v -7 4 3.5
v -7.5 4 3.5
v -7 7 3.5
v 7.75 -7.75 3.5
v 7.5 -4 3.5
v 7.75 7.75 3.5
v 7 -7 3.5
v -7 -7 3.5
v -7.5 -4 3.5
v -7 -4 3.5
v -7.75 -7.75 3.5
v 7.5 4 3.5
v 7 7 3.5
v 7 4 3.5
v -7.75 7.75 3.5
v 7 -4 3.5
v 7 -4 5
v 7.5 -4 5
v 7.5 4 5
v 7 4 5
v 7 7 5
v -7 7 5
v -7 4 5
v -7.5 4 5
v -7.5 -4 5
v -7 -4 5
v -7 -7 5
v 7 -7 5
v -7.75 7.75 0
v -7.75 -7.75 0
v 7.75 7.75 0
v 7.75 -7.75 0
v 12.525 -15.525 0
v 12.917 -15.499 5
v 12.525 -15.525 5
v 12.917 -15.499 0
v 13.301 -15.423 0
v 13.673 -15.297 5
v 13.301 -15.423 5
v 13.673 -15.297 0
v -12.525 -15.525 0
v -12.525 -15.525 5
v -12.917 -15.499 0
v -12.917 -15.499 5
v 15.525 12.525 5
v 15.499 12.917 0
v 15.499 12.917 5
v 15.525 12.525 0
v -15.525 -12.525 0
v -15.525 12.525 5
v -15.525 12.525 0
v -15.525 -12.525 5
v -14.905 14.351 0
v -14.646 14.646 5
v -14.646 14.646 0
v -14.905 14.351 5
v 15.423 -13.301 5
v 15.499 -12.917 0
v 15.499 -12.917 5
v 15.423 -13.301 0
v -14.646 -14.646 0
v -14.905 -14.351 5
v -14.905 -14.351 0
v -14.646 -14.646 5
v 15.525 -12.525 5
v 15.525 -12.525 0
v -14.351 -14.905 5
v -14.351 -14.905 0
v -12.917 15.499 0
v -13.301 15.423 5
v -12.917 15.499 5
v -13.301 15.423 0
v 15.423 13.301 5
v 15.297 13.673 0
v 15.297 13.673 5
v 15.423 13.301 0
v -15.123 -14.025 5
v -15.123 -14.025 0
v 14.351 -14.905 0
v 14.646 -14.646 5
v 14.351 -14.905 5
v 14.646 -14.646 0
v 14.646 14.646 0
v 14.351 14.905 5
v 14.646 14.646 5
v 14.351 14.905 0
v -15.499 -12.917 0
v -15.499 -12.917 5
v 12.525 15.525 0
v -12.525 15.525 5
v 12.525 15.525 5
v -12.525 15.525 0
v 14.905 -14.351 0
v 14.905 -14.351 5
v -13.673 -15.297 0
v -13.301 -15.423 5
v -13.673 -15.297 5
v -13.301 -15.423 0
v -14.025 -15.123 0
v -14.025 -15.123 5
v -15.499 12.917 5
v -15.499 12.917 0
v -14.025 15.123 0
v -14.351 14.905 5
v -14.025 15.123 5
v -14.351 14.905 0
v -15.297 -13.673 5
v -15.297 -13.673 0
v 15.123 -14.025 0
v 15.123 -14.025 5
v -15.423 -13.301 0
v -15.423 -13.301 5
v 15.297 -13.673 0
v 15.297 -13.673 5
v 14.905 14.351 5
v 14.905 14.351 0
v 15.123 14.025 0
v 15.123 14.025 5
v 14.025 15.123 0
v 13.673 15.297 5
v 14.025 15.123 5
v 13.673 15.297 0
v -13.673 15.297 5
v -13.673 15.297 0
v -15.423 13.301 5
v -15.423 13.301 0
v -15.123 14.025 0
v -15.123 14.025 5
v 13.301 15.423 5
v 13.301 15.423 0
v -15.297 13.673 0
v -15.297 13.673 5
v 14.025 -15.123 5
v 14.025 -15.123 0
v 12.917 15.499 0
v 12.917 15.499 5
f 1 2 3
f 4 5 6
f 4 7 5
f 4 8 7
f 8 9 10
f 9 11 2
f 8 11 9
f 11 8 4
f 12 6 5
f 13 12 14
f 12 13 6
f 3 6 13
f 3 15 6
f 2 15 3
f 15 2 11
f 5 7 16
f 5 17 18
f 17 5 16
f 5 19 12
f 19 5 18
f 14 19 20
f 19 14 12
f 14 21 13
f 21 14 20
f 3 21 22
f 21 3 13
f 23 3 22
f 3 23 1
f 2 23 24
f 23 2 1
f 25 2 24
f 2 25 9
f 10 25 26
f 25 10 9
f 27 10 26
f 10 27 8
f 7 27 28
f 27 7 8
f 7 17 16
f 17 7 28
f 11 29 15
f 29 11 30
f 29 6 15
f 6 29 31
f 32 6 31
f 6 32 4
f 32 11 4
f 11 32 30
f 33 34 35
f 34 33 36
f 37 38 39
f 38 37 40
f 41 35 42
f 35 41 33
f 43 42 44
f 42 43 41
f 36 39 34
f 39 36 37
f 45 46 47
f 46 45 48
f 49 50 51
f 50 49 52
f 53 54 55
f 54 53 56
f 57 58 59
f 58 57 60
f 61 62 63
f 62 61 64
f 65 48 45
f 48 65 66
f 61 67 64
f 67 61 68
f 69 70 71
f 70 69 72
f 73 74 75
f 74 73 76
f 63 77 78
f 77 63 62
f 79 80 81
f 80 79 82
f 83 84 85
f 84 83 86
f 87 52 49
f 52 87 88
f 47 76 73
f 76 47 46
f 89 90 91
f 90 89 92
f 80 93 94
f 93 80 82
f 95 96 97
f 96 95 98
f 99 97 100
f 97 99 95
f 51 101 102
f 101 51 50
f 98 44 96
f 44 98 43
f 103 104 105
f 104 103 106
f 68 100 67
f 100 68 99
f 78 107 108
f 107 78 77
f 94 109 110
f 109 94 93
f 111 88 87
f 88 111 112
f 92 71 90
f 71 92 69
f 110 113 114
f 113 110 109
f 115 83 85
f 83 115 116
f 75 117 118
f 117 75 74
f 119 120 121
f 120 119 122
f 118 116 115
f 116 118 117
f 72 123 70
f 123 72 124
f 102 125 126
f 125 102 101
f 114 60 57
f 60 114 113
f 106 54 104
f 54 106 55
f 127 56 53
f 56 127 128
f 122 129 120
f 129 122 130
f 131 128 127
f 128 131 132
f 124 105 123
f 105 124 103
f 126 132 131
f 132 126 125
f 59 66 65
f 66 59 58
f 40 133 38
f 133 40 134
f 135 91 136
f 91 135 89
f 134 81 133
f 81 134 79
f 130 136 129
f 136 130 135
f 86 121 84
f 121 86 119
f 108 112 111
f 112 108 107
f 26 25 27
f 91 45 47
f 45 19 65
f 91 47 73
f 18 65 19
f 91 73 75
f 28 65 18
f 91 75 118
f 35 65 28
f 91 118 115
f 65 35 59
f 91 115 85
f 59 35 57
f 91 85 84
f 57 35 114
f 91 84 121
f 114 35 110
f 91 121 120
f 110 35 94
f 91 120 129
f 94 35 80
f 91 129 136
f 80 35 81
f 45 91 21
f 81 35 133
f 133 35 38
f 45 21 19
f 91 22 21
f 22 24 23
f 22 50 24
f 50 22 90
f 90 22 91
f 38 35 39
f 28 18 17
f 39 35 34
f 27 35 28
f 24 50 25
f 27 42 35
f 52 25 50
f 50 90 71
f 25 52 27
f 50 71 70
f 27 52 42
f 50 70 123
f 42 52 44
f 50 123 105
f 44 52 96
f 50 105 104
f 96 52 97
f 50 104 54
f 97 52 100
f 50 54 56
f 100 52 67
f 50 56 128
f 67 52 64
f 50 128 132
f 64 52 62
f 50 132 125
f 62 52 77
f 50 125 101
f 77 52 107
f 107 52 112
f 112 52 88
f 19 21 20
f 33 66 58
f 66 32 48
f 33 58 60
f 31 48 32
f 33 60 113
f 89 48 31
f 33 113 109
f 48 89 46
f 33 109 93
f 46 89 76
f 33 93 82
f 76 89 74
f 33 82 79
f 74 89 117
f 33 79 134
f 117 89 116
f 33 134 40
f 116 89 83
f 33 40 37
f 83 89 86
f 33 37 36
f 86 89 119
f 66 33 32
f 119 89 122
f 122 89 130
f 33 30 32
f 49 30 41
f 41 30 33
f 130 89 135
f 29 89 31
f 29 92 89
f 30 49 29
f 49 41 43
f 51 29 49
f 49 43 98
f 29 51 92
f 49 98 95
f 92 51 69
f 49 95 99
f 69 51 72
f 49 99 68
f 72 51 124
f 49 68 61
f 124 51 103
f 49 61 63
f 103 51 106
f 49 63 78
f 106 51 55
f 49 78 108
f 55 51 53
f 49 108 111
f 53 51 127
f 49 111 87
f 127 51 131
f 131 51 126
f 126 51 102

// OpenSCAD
// file: keyboard_lib.scad
// keyboard_lib.scad
// Reusable MX switch-plate geometry engine — the SHARED pieces only. Anything
// used by just one entry file lives in that file instead (sample.scad,
// preview.scad, assembly.scad). Parameters + geometry here; NO layout data
// (that's keyboard_layout.scad).
//
// For Gateron / Cherry MX-compatible switches (14.0 mm plate cutout, 19.05 mm pitch).
//
// ------------------------------------------------------------------ HOW TO USE
// Don't render this file directly. From an entry file:
//     use     <keyboard_lib.scad>      // just calling plate()/case()
//     include <keyboard_lib.scad>      // also need the parameters in scope
// `use` imports the modules/functions but NOT the parameters below; that's fine
// when you only call plate()/case() (each resolves its own params here). Files
// that define their own geometry (sample/preview/assembly) `include` instead so
// plate_t, U, etc. are visible to them.
//
// The shared part modules take your layout as ARGUMENTS (rather than reading
// globals) so the engine stays reusable across different boards.

$fn = 48;

/* ============================ BOARD / SWITCH ============================ */
board_w  = 16.5;       // KEY FIELD width  in U (extent the keys occupy)
board_h  = 6.75;       // KEY FIELD height in U
pad      = 0.25;       // padding added around the key field, per side, in U
U        = 19.05;      // 1U pitch (MX standard)
cutout   = 14.0;       // switch plate cutout (square), MX standard
plate_t    = 5.0;      // total plate thickness
clip_lip   = 1.5;      // top retention lip: 14 mm cutout only this deep (MX clips)
body_clear = 15.5;     // opening below the lip — switch body/clips clear here
corner_r   = 3;        // plate corner rounding (0 = square corners)

clip_notches = true;   // small side reliefs so switch clips grab the 1.5 mm lip
enc_hole_d   = 7.2;    // rotary encoder (EC11) shaft-bushing clearance hole

/* ---- case (case / assembly parts) ---- */
wall_t   = 3.0;        // outer wall thickness
floor_t  = 2.5;        // case floor thickness
inner_h  = 13.0;       // cavity depth below the plate (switch bodies + wiring)
ledge    = 3.0;        // inward shelf the plate rests on
plate_gap= 0.25;       // clearance around the plate where it drops into the case
usb_w    = 12.0;       // USB opening width  (back edge, +Y / function-row side)
usb_h    = 7.0;        // USB opening height
support_d = 4.0;       // support-post diameter (fits the ~5 mm row-boundary gaps)
seat_depth = 2.0;      // indent in the plate underside each post seats into
seat_d     = 3.0;      // registration peg diameter on top of each post
seat_fit   = 0.30;     // diametral clearance: the plate pocket is seat_d + seat_fit

/* ============================ ACCESSORS ============================ */
// key record: [ x, y, w, stab, "label" ]  (label accessor lives in preview.scad)
function kx(k) = k[0];
function ky(k) = k[1];
function kw(k) = k[2];
function ks(k) = k[3];

// key center in plate mm coords (origin at plate center; y up so row 0 is at top)
function key_cx(k) = (kx(k) + kw(k)/2 - board_w/2) * U;
function key_cy(k) = (board_h/2 - (ky(k) + 0.5)) * U;
// support-post center (given as [x,y] center in U field coords)
function sup_x(s) = (s[0] - board_w/2) * U;
function sup_y(s) = (board_h/2 - s[1]) * U;

// MX stabilizer stem spacing (mm, center-to-center) by width — approximate
function stab_span(w) = w >= 6 ? 100.0 : (w >= 2 ? 23.8 : 0);

/* ============================ GEOMETRY ============================ */
// stabilizer pockets (2D), centered at origin
module stab_2d(w) {
    span = stab_span(w);
    if (span > 0)
        for (sx = [-1, 1])
            translate([sx * span/2, -0.75]) square([7.0, 15.0], center = true);
}

// 3D stepped switch hole for a `plate_t`-thick plate, centered at origin:
//   top `clip_lip` mm  -> 14 mm square (+ clip notches): retains the MX clips
//   remainder (below)  -> `body_clear` opening: switch body + clips clear
//   stabilizer pockets -> full depth
module key_hole_3d(w, stab) {
    // retention lip at the TOP of the plate
    translate([0, 0, plate_t - clip_lip]) linear_extrude(clip_lip + 0.1) {
        square([cutout, cutout], center = true);
        if (clip_notches)
            for (sx = [-1, 1])
                translate([sx * cutout/2, 0]) square([1.0, cutout - 6], center = true);
    }
    // body relief below the lip, open through the bottom
    translate([0, 0, -0.1]) linear_extrude(plate_t - clip_lip + 0.1)
        square([body_clear, body_clear], center = true);
    // stabilizer pockets, full depth
    if (stab)
        translate([0, 0, -0.1]) linear_extrude(plate_t + 0.2) stab_2d(w);
}

// rounded rectangular plate blank, centered on the origin (key field + pad/side)
module plate_blank_2d() {
    w = (board_w + 2*pad) * U; h = (board_h + 2*pad) * U; r = max(corner_r, 0.001);
    translate([-w/2, -h/2])
        translate([r, r]) offset(r = r) square([w - 2*r, h - 2*r]);
}

/* ============================ PARTS ============================ */
// printable 5 mm plate with stepped switch cutouts (origin at plate center, z=0 bottom)
module plate(keys, encoders, supports) {
    color("SteelBlue")
    difference() {
        linear_extrude(plate_t) plate_blank_2d();
        for (k = keys)
            translate([key_cx(k), key_cy(k), 0]) key_hole_3d(kw(k), ks(k));
        for (e = encoders)
            translate([key_cx(e), key_cy(e), -0.1]) cylinder(d = enc_hole_d, h = plate_t + 0.2);
        // blind seat pockets in the underside (z=0) for the case support pegs
        for (s = supports)
            translate([sup_x(s), sup_y(s), -0.01])
                cylinder(d = seat_d + seat_fit, h = seat_depth + 0.01);
    }
}

// tray case: walls + perimeter ledge the plate drops onto, floor, USB slot, support posts
module case(supports) {
    H       = floor_t + inner_h + plate_t;      // total case height
    plate_hh = (board_h/2 + pad) * U;           // plate half-height (to back edge, +Y)
    color("Gainsboro")
    union() {
        difference() {
            linear_extrude(H) offset(r = wall_t) plate_blank_2d();               // outer shell
            translate([0,0,floor_t]) linear_extrude(H) offset(r = -ledge) plate_blank_2d(); // cavity (leaves ledge)
            translate([0,0,H - plate_t - plate_gap])                             // plate rebate (drop-in)
                linear_extrude(plate_t + plate_gap + 1) offset(r = plate_gap) plate_blank_2d();
            translate([0, plate_hh + wall_t/2, floor_t + inner_h/2])             // USB slot (back)
                cube([usb_w, wall_t*4, usb_h], center = true);
        }
        // support posts: full-diameter shaft to the plate underside, then a
        // registration peg that seats into the plate's indent (shoulder bears flush)
        for (s = supports)
            translate([sup_x(s), sup_y(s), floor_t]) {
                cylinder(d = support_d, h = inner_h);
                translate([0, 0, inner_h]) cylinder(d = seat_d, h = seat_depth - 0.3);
            }
    }
}
// main file
// sample.scad — single-switch fit-test coupon (no layout needed).
//   openscad -o sample.stl sample.scad
// Same plate_t / clip_lip / body_clear as the real plate — print to check fit.
// `include` (not `use`) so the lib's parameters are visible to sample() below.
include <keyboard_lib.scad>

// one stepped cutout in a small handleable square
module sample() {
    s = U + 12;   // coupon side (~31 mm)
    color("SteelBlue")
    difference() {
        linear_extrude(plate_t)
            offset(r = corner_r) square([s - 2*corner_r, s - 2*corner_r], center = true);
        key_hole_3d(1.0, false);
    }
}

sample();
